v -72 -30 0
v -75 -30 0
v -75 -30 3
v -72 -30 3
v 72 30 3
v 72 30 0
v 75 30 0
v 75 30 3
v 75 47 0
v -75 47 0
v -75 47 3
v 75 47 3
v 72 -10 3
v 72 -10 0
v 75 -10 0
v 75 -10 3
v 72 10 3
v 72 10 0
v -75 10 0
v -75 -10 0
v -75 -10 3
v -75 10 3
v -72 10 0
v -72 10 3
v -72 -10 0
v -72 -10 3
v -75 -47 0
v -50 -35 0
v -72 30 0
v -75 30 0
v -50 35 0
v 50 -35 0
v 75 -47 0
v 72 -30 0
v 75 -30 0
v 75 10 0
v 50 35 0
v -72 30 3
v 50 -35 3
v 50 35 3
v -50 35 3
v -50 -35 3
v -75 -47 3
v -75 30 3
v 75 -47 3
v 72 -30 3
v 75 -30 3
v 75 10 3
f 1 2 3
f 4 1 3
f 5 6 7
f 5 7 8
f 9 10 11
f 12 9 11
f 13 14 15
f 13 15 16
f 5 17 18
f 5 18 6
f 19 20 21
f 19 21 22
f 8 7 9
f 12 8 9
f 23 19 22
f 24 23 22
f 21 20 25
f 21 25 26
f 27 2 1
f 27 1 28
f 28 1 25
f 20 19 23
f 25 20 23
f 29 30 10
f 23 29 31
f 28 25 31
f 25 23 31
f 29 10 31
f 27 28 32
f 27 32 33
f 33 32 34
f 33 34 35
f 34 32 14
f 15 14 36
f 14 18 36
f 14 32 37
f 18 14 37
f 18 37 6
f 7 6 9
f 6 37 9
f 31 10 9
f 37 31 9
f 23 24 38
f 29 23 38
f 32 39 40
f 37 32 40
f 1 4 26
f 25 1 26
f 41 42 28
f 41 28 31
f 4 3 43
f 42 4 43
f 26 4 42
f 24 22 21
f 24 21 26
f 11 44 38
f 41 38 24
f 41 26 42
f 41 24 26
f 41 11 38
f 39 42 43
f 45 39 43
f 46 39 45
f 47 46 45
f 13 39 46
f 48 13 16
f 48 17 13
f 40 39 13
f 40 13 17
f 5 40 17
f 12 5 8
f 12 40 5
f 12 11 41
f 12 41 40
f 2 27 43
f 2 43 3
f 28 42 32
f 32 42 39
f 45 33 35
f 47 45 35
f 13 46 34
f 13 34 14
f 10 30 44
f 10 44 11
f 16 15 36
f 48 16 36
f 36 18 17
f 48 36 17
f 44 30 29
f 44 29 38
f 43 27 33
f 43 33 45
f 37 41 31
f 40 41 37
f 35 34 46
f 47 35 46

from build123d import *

# Parameters (mm, degrees)
SKETCH1_W           = 150
SKETCH1_H           = 100
BOSS_EXTRUDE1_DEPTH = 3
CAVITY1_START       = -75
CAVITY1_OUTLINE_W   = 3
CAVITY1_OUTLINE_H   = 3
CAVITY1_DEPTH       = 150
CAVITY1_2_OUTLINE_W = 20
CAVITY1_2_OUTLINE_H = 3
CAVITY1_2_DEPTH     = 3
CAVITY1_START_2     = 72
CAVITY1_3_OUTLINE_W = 20
CAVITY1_3_OUTLINE_H = 3
CAVITY1_3_DEPTH     = 3
SKETCH2_W           = 100
SKETCH2_H           = 70
CUT_EXTRUDE1_DEPTH  = 3


# Read off the part's stored shape, not the designer's step: Cavity1
with BuildPart() as part:
    # Sketch1 → Boss-Extrude1 (new body)
    with BuildSketch(Plane.XY):
        Rectangle(SKETCH1_W, SKETCH1_H)
    extrude(amount=BOSS_EXTRUDE1_DEPTH)

    # Cavity1 outline → Cavity1 (cut)
    with BuildSketch(Plane.YZ.offset(CAVITY1_START)):
        with Locations((48.5, 1.5)):
            Rectangle(CAVITY1_OUTLINE_W, CAVITY1_OUTLINE_H)
        with Locations((-48.5, 1.5)):
            Rectangle(CAVITY1_OUTLINE_W, CAVITY1_OUTLINE_H)
    extrude(amount=CAVITY1_DEPTH, mode=Mode.SUBTRACT)

    # Cavity1 2 outline → Cavity1 2 (cut)
    with BuildSketch(Plane.YZ.offset(CAVITY1_START)):
        with Locations((20, 1.5)):
            Rectangle(CAVITY1_2_OUTLINE_W, CAVITY1_2_OUTLINE_H)
        with Locations((-20, 1.5)):
            Rectangle(CAVITY1_2_OUTLINE_W, CAVITY1_2_OUTLINE_H)
    extrude(amount=CAVITY1_2_DEPTH, mode=Mode.SUBTRACT)

    # Cavity1 3 outline → Cavity1 3 (cut)
    with BuildSketch(Plane.YZ.offset(CAVITY1_START_2)):
        with Locations((20, 1.5)):
            Rectangle(CAVITY1_3_OUTLINE_W, CAVITY1_3_OUTLINE_H)
        with Locations((-20, 1.5)):
            Rectangle(CAVITY1_3_OUTLINE_W, CAVITY1_3_OUTLINE_H)
    extrude(amount=CAVITY1_3_DEPTH, mode=Mode.SUBTRACT)

    # Sketch2 → Cut-Extrude1 (cut)
    with BuildSketch(Plane.XY.offset(3)):
        Rectangle(SKETCH2_W, SKETCH2_H)
    extrude(amount=-CUT_EXTRUDE1_DEPTH, mode=Mode.SUBTRACT)


solid = part.part
